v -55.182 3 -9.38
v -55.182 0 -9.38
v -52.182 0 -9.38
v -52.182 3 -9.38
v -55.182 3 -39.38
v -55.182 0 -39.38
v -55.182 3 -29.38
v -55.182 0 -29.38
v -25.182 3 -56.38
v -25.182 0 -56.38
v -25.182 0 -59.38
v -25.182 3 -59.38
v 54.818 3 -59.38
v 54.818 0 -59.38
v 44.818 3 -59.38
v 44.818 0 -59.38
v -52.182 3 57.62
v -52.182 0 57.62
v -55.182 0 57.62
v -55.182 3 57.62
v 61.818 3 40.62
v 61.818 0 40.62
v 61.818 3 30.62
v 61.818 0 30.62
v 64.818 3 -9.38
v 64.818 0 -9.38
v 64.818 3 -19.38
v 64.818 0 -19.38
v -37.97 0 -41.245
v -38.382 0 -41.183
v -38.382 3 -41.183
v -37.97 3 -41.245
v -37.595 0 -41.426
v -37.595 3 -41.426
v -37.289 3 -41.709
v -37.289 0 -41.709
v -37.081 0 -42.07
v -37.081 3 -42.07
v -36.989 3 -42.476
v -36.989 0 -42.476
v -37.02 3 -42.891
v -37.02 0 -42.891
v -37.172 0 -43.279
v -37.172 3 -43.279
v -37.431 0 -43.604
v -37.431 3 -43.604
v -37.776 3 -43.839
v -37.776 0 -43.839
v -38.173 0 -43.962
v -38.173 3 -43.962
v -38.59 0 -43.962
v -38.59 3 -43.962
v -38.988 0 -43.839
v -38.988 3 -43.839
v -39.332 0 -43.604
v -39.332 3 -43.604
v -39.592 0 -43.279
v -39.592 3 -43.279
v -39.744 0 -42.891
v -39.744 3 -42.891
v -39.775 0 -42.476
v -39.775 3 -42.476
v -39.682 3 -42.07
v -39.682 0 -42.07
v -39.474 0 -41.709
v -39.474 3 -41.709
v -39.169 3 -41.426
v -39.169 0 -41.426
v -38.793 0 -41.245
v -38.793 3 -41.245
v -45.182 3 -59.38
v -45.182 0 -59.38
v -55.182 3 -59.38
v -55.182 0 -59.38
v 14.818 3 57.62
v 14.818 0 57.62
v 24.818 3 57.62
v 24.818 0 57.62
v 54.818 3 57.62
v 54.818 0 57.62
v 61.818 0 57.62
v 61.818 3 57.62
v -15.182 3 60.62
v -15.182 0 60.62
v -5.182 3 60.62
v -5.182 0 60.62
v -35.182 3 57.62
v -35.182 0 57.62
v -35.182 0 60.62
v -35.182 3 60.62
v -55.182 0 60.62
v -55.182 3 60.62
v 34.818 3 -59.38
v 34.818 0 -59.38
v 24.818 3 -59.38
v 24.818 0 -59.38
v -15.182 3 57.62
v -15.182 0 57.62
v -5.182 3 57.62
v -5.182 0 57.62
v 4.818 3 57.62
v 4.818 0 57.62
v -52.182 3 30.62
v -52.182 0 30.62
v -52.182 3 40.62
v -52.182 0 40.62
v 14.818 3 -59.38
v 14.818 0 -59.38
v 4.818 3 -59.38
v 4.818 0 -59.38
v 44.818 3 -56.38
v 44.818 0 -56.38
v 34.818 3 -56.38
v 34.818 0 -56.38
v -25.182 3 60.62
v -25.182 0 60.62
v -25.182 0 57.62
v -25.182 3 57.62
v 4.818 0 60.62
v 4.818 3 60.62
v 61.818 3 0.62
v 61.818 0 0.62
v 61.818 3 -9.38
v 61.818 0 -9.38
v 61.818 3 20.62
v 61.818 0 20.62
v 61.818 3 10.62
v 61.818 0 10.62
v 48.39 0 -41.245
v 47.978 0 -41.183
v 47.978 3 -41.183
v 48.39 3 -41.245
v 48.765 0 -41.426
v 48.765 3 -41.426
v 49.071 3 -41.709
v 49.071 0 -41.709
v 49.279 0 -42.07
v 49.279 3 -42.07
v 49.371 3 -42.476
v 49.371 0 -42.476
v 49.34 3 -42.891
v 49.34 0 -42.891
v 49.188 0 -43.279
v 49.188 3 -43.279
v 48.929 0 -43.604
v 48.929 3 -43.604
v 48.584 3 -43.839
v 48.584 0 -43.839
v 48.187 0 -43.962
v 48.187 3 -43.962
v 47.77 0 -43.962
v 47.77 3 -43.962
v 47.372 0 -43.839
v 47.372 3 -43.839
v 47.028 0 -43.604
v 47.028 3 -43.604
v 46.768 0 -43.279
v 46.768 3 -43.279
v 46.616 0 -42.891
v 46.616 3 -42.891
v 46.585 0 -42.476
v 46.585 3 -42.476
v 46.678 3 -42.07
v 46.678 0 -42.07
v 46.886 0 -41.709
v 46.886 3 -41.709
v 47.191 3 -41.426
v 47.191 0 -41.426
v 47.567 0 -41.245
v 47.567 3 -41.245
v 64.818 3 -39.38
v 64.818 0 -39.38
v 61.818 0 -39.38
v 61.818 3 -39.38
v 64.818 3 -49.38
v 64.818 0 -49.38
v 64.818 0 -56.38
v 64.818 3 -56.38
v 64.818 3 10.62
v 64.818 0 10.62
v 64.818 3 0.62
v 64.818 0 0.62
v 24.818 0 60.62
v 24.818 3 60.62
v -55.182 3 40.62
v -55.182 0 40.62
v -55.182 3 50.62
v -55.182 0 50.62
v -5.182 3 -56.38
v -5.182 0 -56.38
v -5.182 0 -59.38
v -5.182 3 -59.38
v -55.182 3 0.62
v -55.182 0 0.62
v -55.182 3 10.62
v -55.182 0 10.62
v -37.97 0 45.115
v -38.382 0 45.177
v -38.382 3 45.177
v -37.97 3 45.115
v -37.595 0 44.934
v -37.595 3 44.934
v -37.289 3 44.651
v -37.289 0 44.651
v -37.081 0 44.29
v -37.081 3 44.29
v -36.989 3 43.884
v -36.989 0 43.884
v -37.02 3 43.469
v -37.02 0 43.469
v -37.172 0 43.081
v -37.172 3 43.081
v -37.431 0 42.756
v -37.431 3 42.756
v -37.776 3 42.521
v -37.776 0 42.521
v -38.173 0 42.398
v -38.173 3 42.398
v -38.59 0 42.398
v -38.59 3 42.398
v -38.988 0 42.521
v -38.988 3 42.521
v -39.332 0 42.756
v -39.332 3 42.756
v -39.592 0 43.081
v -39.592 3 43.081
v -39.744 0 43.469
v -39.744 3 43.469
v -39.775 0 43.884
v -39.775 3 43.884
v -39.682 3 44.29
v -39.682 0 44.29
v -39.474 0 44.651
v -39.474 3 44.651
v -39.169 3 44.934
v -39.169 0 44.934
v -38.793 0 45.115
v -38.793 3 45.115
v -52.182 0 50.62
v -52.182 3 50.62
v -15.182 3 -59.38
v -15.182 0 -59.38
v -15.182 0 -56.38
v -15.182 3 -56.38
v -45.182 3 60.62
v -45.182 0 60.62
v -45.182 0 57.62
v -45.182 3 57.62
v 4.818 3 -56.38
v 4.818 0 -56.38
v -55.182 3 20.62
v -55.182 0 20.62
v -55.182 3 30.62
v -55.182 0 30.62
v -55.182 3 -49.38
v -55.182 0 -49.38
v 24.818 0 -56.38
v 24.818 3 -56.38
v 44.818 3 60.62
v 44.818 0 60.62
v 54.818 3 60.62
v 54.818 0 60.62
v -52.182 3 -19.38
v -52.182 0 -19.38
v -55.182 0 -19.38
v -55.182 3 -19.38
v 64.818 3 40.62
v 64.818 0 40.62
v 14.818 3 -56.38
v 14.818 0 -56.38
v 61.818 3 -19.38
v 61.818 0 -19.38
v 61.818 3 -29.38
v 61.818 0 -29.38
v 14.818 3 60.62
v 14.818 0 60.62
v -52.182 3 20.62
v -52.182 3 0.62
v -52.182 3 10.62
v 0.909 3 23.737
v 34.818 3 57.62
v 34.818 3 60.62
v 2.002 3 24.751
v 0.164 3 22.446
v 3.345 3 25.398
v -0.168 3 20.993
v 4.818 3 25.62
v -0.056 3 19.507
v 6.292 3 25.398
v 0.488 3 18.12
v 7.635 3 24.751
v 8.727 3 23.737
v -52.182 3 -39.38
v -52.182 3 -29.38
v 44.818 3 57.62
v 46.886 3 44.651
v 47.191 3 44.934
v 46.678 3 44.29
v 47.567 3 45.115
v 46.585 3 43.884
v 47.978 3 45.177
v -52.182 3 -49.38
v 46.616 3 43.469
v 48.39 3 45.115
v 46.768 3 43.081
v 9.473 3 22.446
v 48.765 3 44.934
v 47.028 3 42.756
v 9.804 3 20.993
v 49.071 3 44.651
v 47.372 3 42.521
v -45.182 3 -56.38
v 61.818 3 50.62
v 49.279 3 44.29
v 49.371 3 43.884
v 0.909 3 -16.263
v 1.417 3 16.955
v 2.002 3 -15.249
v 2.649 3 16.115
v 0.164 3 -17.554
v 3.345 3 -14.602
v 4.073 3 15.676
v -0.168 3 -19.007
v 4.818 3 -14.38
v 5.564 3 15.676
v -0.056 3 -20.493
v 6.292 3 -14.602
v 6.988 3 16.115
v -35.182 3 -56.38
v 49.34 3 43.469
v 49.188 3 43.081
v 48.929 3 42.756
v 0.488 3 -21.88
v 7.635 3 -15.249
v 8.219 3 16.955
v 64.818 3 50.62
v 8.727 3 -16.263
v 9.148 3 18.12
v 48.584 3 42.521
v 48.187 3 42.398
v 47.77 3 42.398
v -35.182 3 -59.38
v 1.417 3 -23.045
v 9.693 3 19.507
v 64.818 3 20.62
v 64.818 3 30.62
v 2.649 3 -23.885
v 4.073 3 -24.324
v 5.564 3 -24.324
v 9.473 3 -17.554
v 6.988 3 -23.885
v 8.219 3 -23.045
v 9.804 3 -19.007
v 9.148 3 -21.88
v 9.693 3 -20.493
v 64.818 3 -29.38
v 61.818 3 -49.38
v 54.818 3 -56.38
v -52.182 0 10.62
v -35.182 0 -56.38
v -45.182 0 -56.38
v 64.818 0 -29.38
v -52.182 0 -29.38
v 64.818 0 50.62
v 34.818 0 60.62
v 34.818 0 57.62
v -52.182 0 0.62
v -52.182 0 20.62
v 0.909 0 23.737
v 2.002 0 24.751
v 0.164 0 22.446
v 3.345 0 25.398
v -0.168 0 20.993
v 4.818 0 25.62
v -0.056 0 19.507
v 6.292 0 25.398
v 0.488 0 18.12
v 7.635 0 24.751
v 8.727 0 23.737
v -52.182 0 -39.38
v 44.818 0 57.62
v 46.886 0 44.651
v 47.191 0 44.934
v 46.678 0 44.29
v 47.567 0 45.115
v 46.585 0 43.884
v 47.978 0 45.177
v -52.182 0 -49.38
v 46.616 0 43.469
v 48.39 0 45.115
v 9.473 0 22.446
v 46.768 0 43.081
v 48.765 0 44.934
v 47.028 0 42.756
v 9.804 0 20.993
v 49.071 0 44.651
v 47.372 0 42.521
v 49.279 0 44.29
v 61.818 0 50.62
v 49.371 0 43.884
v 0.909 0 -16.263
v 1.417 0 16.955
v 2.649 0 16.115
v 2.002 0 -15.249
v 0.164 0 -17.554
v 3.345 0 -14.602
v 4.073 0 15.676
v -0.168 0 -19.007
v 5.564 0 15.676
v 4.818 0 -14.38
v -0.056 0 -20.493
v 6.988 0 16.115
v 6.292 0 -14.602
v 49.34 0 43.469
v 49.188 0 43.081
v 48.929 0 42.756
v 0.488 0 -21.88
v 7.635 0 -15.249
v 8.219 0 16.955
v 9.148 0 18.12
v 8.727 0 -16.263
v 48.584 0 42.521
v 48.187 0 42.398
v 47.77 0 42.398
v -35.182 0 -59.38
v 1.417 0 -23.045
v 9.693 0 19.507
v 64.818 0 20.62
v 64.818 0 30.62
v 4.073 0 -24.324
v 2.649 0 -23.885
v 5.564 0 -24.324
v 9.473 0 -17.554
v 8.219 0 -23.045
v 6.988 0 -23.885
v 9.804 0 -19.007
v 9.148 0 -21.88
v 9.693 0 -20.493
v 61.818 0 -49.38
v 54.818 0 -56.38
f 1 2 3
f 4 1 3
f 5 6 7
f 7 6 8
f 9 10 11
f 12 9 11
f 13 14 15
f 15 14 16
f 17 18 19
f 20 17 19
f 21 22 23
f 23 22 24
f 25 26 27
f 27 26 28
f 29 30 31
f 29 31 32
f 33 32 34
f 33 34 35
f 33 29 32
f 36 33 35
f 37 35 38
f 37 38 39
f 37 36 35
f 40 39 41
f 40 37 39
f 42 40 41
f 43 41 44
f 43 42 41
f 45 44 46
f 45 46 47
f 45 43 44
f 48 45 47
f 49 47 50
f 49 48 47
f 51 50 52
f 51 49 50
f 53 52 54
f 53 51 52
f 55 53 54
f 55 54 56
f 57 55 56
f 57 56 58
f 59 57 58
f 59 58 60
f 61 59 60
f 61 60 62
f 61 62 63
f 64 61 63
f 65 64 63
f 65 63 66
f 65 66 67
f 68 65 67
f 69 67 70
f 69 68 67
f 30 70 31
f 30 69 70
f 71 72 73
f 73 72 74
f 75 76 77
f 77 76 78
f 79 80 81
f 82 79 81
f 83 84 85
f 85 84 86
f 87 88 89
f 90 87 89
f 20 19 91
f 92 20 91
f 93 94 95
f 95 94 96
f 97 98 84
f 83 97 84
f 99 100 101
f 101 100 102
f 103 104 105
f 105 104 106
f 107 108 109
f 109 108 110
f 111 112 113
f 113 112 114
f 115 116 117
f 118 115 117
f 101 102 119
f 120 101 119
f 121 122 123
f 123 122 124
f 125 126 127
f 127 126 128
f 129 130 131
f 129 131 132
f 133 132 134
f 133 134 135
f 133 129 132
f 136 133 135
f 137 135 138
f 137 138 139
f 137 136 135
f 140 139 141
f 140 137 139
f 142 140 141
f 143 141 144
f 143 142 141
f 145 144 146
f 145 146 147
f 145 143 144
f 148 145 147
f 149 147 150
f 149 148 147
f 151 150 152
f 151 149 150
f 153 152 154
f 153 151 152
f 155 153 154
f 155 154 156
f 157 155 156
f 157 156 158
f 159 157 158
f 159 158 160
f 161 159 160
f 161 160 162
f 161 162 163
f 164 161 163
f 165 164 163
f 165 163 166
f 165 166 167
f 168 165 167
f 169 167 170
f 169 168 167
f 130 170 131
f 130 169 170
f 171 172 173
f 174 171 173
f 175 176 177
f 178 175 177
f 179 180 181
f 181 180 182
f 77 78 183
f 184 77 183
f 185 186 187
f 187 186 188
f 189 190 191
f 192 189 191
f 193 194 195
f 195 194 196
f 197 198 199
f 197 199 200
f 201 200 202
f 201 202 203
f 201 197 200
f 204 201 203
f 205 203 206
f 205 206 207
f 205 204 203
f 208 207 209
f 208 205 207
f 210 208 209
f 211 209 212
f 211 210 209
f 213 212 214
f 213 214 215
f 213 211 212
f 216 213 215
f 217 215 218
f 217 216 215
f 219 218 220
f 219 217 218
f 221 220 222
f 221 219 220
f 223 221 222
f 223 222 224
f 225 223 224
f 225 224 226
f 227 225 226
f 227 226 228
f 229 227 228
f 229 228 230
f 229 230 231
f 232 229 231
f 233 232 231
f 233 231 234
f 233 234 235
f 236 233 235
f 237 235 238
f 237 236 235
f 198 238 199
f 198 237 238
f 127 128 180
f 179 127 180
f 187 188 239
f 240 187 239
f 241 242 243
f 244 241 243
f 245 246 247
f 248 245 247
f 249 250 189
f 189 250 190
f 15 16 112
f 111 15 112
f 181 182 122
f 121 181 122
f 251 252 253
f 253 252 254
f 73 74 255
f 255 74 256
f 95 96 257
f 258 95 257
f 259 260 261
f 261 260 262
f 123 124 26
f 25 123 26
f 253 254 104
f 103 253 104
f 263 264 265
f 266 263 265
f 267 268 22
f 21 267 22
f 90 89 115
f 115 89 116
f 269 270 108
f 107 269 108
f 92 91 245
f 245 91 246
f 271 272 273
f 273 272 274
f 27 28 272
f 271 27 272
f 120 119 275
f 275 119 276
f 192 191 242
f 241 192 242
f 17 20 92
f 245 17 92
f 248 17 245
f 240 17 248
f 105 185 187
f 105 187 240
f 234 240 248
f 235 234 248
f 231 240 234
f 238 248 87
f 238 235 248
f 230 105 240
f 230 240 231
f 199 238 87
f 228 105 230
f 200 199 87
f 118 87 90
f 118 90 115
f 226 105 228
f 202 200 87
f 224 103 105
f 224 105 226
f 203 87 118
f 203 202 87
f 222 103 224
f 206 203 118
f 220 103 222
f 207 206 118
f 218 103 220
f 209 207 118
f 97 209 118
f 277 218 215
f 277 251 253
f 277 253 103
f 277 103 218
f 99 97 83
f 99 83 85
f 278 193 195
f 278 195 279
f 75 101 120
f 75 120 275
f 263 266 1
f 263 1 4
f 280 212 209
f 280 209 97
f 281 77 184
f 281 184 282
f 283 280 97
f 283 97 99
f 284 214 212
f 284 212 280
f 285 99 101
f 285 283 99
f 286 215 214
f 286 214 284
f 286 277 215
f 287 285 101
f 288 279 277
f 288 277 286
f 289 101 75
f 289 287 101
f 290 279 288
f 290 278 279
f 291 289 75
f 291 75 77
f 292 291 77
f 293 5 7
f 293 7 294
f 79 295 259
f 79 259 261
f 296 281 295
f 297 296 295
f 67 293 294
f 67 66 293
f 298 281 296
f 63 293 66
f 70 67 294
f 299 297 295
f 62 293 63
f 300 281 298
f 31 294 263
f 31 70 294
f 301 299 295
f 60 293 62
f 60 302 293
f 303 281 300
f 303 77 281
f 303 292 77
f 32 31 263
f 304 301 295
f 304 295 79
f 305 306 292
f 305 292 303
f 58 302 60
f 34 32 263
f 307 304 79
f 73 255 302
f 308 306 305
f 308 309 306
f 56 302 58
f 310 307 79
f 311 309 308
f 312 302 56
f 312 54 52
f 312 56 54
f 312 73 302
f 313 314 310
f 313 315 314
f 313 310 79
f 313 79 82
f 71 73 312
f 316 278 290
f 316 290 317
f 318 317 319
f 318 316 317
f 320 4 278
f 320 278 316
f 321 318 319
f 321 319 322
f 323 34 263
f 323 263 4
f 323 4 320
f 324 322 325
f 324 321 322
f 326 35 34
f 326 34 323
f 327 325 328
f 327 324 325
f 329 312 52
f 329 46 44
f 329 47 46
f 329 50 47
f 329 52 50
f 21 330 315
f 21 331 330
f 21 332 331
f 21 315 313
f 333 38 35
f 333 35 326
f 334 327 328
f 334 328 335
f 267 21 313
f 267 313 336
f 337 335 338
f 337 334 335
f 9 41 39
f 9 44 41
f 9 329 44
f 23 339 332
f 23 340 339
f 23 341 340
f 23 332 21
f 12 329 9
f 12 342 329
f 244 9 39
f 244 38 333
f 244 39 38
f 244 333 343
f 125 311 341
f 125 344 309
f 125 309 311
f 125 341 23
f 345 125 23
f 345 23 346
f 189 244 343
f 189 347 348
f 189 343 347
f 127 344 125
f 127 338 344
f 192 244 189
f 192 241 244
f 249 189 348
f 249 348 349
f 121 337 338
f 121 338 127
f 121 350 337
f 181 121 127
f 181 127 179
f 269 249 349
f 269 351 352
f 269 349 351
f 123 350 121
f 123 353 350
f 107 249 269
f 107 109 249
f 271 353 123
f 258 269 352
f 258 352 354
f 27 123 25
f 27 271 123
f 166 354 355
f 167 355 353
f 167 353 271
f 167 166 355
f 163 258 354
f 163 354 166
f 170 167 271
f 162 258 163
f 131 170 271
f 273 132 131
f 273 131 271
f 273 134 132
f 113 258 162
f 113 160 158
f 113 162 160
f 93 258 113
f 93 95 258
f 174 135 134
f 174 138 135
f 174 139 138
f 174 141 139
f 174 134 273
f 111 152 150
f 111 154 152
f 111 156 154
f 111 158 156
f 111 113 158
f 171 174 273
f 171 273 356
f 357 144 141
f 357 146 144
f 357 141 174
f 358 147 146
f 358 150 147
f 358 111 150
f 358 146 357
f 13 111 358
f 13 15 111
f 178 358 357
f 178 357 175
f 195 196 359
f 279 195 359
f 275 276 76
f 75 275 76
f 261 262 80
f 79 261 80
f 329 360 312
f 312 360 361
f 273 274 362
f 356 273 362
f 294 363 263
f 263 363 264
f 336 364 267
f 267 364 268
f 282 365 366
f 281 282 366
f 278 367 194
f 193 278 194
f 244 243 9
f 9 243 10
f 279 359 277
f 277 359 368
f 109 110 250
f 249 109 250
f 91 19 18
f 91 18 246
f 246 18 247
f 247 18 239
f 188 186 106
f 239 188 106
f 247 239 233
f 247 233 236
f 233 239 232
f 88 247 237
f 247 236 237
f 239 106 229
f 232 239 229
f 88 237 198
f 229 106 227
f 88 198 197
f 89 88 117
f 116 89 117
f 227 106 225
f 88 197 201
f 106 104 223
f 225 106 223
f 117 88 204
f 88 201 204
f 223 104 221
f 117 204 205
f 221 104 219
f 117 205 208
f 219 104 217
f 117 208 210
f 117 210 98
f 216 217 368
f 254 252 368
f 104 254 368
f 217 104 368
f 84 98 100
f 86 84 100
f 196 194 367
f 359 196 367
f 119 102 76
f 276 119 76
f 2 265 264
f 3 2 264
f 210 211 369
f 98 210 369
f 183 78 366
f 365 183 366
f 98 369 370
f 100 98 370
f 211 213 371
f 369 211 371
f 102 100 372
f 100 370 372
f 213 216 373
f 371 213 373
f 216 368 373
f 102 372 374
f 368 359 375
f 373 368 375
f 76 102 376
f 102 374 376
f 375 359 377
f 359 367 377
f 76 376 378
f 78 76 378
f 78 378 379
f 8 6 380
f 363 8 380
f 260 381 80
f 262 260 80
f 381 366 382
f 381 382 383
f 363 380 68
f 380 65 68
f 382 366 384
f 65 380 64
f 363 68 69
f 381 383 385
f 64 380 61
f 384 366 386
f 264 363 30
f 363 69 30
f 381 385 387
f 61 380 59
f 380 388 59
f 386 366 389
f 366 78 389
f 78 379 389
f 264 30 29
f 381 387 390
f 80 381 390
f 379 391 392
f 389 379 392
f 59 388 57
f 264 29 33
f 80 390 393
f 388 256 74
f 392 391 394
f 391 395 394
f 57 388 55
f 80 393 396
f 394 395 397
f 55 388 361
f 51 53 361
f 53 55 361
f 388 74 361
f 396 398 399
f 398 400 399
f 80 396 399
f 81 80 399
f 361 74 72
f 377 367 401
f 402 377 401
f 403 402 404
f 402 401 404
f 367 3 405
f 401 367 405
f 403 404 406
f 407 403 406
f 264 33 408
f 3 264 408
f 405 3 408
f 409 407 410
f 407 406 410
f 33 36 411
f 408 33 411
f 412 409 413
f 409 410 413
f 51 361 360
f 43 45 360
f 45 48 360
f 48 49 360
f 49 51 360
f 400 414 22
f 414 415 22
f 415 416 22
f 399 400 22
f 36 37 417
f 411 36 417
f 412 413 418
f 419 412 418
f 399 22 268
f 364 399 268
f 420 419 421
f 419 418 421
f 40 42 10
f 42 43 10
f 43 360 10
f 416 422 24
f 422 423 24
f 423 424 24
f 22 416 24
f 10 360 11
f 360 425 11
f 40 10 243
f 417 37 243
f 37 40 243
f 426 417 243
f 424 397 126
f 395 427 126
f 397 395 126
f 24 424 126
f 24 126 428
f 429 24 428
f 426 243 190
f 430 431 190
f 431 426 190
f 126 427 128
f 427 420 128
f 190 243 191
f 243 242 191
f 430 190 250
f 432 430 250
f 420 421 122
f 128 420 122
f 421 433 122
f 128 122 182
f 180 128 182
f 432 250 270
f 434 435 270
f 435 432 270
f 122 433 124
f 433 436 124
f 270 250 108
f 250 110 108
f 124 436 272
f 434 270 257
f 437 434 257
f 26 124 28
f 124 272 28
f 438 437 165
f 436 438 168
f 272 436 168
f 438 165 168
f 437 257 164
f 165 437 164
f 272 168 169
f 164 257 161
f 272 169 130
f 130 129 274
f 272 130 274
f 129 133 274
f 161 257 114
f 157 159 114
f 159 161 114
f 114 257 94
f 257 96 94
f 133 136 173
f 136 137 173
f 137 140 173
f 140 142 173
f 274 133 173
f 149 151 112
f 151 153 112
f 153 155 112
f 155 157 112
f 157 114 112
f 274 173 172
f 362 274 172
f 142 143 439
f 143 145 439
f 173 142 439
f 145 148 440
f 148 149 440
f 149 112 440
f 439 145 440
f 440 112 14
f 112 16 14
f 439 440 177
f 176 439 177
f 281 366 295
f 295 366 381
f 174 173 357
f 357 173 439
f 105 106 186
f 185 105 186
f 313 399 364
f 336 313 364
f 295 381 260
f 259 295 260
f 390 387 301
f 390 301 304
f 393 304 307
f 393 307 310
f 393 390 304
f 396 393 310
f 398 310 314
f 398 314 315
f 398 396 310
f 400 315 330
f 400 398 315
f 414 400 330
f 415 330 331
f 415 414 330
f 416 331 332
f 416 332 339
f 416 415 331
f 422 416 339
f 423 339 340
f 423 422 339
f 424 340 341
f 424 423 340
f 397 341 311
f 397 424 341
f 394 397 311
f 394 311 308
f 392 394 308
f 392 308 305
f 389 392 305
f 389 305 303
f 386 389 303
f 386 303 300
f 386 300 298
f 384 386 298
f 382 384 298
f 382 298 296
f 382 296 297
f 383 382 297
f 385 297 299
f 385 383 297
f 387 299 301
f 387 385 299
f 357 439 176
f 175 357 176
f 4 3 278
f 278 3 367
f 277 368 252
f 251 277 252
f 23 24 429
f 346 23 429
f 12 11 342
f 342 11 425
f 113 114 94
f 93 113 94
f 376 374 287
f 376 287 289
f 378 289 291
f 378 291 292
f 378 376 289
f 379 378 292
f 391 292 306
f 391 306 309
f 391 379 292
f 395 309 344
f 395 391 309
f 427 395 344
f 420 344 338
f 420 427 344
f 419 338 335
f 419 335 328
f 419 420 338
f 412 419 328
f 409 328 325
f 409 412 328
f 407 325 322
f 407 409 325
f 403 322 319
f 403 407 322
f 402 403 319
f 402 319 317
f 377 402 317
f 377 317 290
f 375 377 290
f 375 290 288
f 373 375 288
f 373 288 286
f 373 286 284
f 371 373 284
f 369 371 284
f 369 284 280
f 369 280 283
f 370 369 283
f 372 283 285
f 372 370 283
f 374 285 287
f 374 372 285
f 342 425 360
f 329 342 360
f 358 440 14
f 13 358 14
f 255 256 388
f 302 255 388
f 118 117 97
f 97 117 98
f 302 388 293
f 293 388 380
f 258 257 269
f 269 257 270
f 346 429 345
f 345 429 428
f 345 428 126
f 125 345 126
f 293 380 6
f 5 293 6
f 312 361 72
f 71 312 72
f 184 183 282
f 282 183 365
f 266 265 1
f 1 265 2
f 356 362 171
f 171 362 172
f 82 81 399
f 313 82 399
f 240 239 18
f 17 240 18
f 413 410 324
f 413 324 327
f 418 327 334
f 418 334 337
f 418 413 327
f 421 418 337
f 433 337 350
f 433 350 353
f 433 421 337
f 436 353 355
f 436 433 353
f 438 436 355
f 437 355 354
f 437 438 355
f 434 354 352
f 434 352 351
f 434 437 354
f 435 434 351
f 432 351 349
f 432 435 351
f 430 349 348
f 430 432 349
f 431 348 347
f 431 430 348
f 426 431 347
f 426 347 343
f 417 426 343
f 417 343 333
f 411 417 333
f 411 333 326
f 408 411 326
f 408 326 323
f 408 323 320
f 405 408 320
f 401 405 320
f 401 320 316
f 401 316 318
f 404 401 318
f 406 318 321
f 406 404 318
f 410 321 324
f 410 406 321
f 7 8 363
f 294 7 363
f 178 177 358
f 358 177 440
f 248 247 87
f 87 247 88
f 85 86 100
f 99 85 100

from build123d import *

# Parameters (mm, degrees)
SKETCH1_R           = 1.397
SKETCH1_R_2         = 5
BOSS_EXTRUDE1_DEPTH = 3


with BuildPart() as part:
    # Sketch1 → Boss-Extrude1 (new body)
    with BuildSketch(Plane(origin=(0, 0, 0), x_dir=(1, 0, 0), z_dir=(0, 1, 0))):
        Polygon((-45.181694993, 59.380211874), (-55.181694993, 59.380211874), (-55.181694993, 49.380211874), (-52.181694993, 49.380211874), (-52.181694993, 39.380211874), (-55.181694993, 39.380211874), (-55.181694993, 29.380211874), (-52.181694993, 29.380211874), (-52.181694993, 19.380211874), (-55.181694993, 19.380211874), (-55.181694993, 9.380211874), (-52.181694993, 9.380211874), (-52.181694993, -0.619788126), (-55.181694993, -0.619788126), (-55.181694993, -10.619788126), (-52.181694993, -10.619788126), (-52.181694993, -20.619788126), (-55.181694993, -20.619788126), (-55.181694993, -30.619788126), (-52.181694993, -30.619788126), (-52.181694993, -40.619788126), (-55.181694993, -40.619788126), (-55.181694993, -50.619788126), (-52.181694993, -50.619788126), (-52.181694993, -57.619788126), (-55.181694993, -57.619788126), (-55.181694993, -60.619788126), (-45.181694993, -60.619788126), (-45.181694993, -57.619788126), (-35.181694993, -57.619788126), (-35.181694993, -60.619788126), (-25.181694993, -60.619788126), (-25.181694993, -57.619788126), (-15.181694993, -57.619788126), (-15.181694993, -60.619788126), (-5.181694993, -60.619788126), (-5.181694993, -57.619788126), (4.818305007, -57.619788126), (4.818305007, -60.619788126), (14.818305007, -60.619788126), (14.818305007, -57.619788126), (24.818305007, -57.619788126), (24.818305007, -60.619788126), (34.818305007, -60.619788126), (34.818305007, -57.619788126), (44.818305007, -57.619788126), (44.818305007, -60.619788126), (54.818305007, -60.619788126), (54.818305007, -57.619788126), (61.818305007, -57.619788126), (61.818305007, -50.619788126), (64.818305007, -50.619788126), (64.818305007, -40.619788126), (61.818305007, -40.619788126), (61.818305007, -30.619788126), (64.818305007, -30.619788126), (64.818305007, -20.619788126), (61.818305007, -20.619788126), (61.818305007, -10.619788126), (64.818305007, -10.619788126), (64.818305007, -0.619788126), (61.818305007, -0.619788126), (61.818305007, 9.380211874), (64.818305007, 9.380211874), (64.818305007, 19.380211874), (61.818305007, 19.380211874), (61.818305007, 29.380211874), (64.818305007, 29.380211874), (64.818305007, 39.380211874), (61.818305007, 39.380211874), (61.818305007, 49.380211874), (64.818305007, 49.380211874), (64.818305007, 56.380211874), (54.818305007, 56.380211874), (54.818305007, 59.380211874), (44.818305007, 59.380211874), (44.818305007, 56.380211874), (34.818305007, 56.380211874), (34.818305007, 59.380211874), (24.818305007, 59.380211874), (24.818305007, 56.380211874), (14.818305007, 56.380211874), (14.818305007, 59.380211874), (4.818305007, 59.380211874), (4.818305007, 56.380211874), (-5.181694993, 56.380211874), (-5.181694993, 59.380211874), (-15.181694993, 59.380211874), (-15.181694993, 56.380211874), (-25.181694993, 56.380211874), (-25.181694993, 59.380211874), (-35.181694993, 59.380211874), (-35.181694993, 56.380211874), (-45.181694993, 56.380211874), align=None)
        with Locations(Location((-38.381694993, -43.779788126, 0), (0, 0, 270))):
            Circle(SKETCH1_R, mode=Mode.SUBTRACT)
        with Locations(Location((47.978305007, -43.779788126, 0), (0, 0, 270))):
            Circle(SKETCH1_R, mode=Mode.SUBTRACT)
        with Locations(Location((4.818305007, -20.619788126, 0), (0, 0, 270))):
            Circle(SKETCH1_R_2, mode=Mode.SUBTRACT)
        with Locations(Location((-38.381694993, 42.580211874, 0), (0, 0, 270))):
            Circle(SKETCH1_R, mode=Mode.SUBTRACT)
        with Locations(Location((4.818305007, 19.380211874, 0), (0, 0, 270))):
            Circle(SKETCH1_R_2, mode=Mode.SUBTRACT)
        with Locations(Location((47.978305007, 42.580211874, 0), (0, 0, 270))):
            Circle(SKETCH1_R, mode=Mode.SUBTRACT)
    extrude(amount=BOSS_EXTRUDE1_DEPTH)


solid = part.part
